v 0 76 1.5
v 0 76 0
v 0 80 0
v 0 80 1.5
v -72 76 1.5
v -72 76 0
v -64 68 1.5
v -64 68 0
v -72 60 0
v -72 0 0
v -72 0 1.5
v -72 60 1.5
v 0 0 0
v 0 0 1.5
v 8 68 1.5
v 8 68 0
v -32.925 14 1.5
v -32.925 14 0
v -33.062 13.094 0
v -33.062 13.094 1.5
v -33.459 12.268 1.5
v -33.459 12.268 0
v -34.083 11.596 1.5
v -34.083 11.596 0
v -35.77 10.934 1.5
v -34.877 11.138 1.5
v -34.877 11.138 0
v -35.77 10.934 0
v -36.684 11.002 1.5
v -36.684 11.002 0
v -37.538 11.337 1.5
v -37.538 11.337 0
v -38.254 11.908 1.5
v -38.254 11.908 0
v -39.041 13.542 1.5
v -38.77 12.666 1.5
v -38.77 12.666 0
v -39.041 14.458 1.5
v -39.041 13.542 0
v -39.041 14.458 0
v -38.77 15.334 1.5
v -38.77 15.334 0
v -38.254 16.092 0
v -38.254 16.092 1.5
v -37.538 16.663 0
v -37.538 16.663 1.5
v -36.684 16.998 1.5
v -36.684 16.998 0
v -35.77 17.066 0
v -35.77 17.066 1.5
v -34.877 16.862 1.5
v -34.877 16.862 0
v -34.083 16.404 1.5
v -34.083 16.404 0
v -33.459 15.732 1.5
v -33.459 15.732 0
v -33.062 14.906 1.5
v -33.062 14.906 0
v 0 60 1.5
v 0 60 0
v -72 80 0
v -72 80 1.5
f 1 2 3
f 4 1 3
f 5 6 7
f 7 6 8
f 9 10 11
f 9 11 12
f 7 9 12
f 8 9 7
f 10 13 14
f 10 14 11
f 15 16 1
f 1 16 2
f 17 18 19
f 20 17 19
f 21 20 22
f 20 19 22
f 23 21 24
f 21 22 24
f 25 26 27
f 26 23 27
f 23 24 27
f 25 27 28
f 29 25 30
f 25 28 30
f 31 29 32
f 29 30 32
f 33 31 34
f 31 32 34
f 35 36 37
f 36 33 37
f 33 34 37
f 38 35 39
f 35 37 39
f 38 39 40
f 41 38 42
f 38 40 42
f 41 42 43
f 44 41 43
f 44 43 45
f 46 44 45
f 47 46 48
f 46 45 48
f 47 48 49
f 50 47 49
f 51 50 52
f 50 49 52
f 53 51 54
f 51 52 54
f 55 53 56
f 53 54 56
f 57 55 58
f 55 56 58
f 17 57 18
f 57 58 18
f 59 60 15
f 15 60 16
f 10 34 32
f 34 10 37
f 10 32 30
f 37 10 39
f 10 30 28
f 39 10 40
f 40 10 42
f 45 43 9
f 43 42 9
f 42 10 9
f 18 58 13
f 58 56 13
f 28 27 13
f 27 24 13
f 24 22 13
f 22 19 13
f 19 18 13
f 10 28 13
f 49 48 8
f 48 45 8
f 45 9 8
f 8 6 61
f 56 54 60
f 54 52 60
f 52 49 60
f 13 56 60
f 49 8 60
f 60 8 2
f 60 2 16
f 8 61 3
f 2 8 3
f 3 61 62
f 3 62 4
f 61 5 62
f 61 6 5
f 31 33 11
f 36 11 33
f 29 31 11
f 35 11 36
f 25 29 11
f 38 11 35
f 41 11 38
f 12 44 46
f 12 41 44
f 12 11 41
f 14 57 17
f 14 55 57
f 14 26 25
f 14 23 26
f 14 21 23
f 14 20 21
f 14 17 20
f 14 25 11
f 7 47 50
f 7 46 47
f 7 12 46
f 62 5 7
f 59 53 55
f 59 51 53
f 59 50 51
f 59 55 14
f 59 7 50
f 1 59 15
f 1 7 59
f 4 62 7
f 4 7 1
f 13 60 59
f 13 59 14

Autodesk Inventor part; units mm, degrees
ref_plane "YZ Plane" through (0, 0, 0) normal (1, 0, 0) x (0, 1, 0)
ref_plane "XZ Plane" through (0, 0, 0) normal (0, 1, 0) x (-1, 0, 0)
ref_plane "XY Plane" through (0, 0, 0) normal (0, 0, 1) x (1, 0, 0)
sketch "Sketch1" plane through (0, 0, 0) normal (0, 0, 1) x (1, 0, 0)
  line L0 (0, 0) -> (-72, 0)
  circle A0 centre (-72, 68) radius 8 construction
  line L1 (-72, 60) -> (0, 60) construction
  line L2 (-72, 76) -> (-64, 68)
  line L3 (-72, 60) -> (-64, 68)
  line L4 (0, 60) -> (0, 0)
  line L5 (-72, 0) -> (-72, 60)
  line L6 (-72, 76) -> (-72, 80)
  line L7 (0, 76) -> (0, 80)
  line L8 (-72, 80) -> (0, 80)
  line L9 (-72, 76) -> (11.0791, 76) construction
  line L10 (-64, 68) -> (11.3495, 68) construction
  line L11 (-72, 60) -> (22.6598, 60) construction
  circle A1 centre (0, 68) radius 8 construction
  line L12 (0, 60) -> (8, 68)
  line L13 (8, 68) -> (0, 76)
  line L14 (-36, 0) -> (-36, 14) construction
  circle A2 centre (-36, 14) radius 3.075
  point P0 (0, 0)
  point P1 (0, 78)
  point P2 (-72, 78)
  dimension "d0" = 80
  dimension "d2" = 60
  dimension "d3" = 0
  dimension "d4" = 0
  dimension "d5" = 72
  dimension "d8" = 14
  dimension "d9" = 6.15
  dimension "d12" = 36
extrude "Extrusion2" add sketch "Sketch1" along normal blind 1.5
properties part number "MS_RI_black_v3"
